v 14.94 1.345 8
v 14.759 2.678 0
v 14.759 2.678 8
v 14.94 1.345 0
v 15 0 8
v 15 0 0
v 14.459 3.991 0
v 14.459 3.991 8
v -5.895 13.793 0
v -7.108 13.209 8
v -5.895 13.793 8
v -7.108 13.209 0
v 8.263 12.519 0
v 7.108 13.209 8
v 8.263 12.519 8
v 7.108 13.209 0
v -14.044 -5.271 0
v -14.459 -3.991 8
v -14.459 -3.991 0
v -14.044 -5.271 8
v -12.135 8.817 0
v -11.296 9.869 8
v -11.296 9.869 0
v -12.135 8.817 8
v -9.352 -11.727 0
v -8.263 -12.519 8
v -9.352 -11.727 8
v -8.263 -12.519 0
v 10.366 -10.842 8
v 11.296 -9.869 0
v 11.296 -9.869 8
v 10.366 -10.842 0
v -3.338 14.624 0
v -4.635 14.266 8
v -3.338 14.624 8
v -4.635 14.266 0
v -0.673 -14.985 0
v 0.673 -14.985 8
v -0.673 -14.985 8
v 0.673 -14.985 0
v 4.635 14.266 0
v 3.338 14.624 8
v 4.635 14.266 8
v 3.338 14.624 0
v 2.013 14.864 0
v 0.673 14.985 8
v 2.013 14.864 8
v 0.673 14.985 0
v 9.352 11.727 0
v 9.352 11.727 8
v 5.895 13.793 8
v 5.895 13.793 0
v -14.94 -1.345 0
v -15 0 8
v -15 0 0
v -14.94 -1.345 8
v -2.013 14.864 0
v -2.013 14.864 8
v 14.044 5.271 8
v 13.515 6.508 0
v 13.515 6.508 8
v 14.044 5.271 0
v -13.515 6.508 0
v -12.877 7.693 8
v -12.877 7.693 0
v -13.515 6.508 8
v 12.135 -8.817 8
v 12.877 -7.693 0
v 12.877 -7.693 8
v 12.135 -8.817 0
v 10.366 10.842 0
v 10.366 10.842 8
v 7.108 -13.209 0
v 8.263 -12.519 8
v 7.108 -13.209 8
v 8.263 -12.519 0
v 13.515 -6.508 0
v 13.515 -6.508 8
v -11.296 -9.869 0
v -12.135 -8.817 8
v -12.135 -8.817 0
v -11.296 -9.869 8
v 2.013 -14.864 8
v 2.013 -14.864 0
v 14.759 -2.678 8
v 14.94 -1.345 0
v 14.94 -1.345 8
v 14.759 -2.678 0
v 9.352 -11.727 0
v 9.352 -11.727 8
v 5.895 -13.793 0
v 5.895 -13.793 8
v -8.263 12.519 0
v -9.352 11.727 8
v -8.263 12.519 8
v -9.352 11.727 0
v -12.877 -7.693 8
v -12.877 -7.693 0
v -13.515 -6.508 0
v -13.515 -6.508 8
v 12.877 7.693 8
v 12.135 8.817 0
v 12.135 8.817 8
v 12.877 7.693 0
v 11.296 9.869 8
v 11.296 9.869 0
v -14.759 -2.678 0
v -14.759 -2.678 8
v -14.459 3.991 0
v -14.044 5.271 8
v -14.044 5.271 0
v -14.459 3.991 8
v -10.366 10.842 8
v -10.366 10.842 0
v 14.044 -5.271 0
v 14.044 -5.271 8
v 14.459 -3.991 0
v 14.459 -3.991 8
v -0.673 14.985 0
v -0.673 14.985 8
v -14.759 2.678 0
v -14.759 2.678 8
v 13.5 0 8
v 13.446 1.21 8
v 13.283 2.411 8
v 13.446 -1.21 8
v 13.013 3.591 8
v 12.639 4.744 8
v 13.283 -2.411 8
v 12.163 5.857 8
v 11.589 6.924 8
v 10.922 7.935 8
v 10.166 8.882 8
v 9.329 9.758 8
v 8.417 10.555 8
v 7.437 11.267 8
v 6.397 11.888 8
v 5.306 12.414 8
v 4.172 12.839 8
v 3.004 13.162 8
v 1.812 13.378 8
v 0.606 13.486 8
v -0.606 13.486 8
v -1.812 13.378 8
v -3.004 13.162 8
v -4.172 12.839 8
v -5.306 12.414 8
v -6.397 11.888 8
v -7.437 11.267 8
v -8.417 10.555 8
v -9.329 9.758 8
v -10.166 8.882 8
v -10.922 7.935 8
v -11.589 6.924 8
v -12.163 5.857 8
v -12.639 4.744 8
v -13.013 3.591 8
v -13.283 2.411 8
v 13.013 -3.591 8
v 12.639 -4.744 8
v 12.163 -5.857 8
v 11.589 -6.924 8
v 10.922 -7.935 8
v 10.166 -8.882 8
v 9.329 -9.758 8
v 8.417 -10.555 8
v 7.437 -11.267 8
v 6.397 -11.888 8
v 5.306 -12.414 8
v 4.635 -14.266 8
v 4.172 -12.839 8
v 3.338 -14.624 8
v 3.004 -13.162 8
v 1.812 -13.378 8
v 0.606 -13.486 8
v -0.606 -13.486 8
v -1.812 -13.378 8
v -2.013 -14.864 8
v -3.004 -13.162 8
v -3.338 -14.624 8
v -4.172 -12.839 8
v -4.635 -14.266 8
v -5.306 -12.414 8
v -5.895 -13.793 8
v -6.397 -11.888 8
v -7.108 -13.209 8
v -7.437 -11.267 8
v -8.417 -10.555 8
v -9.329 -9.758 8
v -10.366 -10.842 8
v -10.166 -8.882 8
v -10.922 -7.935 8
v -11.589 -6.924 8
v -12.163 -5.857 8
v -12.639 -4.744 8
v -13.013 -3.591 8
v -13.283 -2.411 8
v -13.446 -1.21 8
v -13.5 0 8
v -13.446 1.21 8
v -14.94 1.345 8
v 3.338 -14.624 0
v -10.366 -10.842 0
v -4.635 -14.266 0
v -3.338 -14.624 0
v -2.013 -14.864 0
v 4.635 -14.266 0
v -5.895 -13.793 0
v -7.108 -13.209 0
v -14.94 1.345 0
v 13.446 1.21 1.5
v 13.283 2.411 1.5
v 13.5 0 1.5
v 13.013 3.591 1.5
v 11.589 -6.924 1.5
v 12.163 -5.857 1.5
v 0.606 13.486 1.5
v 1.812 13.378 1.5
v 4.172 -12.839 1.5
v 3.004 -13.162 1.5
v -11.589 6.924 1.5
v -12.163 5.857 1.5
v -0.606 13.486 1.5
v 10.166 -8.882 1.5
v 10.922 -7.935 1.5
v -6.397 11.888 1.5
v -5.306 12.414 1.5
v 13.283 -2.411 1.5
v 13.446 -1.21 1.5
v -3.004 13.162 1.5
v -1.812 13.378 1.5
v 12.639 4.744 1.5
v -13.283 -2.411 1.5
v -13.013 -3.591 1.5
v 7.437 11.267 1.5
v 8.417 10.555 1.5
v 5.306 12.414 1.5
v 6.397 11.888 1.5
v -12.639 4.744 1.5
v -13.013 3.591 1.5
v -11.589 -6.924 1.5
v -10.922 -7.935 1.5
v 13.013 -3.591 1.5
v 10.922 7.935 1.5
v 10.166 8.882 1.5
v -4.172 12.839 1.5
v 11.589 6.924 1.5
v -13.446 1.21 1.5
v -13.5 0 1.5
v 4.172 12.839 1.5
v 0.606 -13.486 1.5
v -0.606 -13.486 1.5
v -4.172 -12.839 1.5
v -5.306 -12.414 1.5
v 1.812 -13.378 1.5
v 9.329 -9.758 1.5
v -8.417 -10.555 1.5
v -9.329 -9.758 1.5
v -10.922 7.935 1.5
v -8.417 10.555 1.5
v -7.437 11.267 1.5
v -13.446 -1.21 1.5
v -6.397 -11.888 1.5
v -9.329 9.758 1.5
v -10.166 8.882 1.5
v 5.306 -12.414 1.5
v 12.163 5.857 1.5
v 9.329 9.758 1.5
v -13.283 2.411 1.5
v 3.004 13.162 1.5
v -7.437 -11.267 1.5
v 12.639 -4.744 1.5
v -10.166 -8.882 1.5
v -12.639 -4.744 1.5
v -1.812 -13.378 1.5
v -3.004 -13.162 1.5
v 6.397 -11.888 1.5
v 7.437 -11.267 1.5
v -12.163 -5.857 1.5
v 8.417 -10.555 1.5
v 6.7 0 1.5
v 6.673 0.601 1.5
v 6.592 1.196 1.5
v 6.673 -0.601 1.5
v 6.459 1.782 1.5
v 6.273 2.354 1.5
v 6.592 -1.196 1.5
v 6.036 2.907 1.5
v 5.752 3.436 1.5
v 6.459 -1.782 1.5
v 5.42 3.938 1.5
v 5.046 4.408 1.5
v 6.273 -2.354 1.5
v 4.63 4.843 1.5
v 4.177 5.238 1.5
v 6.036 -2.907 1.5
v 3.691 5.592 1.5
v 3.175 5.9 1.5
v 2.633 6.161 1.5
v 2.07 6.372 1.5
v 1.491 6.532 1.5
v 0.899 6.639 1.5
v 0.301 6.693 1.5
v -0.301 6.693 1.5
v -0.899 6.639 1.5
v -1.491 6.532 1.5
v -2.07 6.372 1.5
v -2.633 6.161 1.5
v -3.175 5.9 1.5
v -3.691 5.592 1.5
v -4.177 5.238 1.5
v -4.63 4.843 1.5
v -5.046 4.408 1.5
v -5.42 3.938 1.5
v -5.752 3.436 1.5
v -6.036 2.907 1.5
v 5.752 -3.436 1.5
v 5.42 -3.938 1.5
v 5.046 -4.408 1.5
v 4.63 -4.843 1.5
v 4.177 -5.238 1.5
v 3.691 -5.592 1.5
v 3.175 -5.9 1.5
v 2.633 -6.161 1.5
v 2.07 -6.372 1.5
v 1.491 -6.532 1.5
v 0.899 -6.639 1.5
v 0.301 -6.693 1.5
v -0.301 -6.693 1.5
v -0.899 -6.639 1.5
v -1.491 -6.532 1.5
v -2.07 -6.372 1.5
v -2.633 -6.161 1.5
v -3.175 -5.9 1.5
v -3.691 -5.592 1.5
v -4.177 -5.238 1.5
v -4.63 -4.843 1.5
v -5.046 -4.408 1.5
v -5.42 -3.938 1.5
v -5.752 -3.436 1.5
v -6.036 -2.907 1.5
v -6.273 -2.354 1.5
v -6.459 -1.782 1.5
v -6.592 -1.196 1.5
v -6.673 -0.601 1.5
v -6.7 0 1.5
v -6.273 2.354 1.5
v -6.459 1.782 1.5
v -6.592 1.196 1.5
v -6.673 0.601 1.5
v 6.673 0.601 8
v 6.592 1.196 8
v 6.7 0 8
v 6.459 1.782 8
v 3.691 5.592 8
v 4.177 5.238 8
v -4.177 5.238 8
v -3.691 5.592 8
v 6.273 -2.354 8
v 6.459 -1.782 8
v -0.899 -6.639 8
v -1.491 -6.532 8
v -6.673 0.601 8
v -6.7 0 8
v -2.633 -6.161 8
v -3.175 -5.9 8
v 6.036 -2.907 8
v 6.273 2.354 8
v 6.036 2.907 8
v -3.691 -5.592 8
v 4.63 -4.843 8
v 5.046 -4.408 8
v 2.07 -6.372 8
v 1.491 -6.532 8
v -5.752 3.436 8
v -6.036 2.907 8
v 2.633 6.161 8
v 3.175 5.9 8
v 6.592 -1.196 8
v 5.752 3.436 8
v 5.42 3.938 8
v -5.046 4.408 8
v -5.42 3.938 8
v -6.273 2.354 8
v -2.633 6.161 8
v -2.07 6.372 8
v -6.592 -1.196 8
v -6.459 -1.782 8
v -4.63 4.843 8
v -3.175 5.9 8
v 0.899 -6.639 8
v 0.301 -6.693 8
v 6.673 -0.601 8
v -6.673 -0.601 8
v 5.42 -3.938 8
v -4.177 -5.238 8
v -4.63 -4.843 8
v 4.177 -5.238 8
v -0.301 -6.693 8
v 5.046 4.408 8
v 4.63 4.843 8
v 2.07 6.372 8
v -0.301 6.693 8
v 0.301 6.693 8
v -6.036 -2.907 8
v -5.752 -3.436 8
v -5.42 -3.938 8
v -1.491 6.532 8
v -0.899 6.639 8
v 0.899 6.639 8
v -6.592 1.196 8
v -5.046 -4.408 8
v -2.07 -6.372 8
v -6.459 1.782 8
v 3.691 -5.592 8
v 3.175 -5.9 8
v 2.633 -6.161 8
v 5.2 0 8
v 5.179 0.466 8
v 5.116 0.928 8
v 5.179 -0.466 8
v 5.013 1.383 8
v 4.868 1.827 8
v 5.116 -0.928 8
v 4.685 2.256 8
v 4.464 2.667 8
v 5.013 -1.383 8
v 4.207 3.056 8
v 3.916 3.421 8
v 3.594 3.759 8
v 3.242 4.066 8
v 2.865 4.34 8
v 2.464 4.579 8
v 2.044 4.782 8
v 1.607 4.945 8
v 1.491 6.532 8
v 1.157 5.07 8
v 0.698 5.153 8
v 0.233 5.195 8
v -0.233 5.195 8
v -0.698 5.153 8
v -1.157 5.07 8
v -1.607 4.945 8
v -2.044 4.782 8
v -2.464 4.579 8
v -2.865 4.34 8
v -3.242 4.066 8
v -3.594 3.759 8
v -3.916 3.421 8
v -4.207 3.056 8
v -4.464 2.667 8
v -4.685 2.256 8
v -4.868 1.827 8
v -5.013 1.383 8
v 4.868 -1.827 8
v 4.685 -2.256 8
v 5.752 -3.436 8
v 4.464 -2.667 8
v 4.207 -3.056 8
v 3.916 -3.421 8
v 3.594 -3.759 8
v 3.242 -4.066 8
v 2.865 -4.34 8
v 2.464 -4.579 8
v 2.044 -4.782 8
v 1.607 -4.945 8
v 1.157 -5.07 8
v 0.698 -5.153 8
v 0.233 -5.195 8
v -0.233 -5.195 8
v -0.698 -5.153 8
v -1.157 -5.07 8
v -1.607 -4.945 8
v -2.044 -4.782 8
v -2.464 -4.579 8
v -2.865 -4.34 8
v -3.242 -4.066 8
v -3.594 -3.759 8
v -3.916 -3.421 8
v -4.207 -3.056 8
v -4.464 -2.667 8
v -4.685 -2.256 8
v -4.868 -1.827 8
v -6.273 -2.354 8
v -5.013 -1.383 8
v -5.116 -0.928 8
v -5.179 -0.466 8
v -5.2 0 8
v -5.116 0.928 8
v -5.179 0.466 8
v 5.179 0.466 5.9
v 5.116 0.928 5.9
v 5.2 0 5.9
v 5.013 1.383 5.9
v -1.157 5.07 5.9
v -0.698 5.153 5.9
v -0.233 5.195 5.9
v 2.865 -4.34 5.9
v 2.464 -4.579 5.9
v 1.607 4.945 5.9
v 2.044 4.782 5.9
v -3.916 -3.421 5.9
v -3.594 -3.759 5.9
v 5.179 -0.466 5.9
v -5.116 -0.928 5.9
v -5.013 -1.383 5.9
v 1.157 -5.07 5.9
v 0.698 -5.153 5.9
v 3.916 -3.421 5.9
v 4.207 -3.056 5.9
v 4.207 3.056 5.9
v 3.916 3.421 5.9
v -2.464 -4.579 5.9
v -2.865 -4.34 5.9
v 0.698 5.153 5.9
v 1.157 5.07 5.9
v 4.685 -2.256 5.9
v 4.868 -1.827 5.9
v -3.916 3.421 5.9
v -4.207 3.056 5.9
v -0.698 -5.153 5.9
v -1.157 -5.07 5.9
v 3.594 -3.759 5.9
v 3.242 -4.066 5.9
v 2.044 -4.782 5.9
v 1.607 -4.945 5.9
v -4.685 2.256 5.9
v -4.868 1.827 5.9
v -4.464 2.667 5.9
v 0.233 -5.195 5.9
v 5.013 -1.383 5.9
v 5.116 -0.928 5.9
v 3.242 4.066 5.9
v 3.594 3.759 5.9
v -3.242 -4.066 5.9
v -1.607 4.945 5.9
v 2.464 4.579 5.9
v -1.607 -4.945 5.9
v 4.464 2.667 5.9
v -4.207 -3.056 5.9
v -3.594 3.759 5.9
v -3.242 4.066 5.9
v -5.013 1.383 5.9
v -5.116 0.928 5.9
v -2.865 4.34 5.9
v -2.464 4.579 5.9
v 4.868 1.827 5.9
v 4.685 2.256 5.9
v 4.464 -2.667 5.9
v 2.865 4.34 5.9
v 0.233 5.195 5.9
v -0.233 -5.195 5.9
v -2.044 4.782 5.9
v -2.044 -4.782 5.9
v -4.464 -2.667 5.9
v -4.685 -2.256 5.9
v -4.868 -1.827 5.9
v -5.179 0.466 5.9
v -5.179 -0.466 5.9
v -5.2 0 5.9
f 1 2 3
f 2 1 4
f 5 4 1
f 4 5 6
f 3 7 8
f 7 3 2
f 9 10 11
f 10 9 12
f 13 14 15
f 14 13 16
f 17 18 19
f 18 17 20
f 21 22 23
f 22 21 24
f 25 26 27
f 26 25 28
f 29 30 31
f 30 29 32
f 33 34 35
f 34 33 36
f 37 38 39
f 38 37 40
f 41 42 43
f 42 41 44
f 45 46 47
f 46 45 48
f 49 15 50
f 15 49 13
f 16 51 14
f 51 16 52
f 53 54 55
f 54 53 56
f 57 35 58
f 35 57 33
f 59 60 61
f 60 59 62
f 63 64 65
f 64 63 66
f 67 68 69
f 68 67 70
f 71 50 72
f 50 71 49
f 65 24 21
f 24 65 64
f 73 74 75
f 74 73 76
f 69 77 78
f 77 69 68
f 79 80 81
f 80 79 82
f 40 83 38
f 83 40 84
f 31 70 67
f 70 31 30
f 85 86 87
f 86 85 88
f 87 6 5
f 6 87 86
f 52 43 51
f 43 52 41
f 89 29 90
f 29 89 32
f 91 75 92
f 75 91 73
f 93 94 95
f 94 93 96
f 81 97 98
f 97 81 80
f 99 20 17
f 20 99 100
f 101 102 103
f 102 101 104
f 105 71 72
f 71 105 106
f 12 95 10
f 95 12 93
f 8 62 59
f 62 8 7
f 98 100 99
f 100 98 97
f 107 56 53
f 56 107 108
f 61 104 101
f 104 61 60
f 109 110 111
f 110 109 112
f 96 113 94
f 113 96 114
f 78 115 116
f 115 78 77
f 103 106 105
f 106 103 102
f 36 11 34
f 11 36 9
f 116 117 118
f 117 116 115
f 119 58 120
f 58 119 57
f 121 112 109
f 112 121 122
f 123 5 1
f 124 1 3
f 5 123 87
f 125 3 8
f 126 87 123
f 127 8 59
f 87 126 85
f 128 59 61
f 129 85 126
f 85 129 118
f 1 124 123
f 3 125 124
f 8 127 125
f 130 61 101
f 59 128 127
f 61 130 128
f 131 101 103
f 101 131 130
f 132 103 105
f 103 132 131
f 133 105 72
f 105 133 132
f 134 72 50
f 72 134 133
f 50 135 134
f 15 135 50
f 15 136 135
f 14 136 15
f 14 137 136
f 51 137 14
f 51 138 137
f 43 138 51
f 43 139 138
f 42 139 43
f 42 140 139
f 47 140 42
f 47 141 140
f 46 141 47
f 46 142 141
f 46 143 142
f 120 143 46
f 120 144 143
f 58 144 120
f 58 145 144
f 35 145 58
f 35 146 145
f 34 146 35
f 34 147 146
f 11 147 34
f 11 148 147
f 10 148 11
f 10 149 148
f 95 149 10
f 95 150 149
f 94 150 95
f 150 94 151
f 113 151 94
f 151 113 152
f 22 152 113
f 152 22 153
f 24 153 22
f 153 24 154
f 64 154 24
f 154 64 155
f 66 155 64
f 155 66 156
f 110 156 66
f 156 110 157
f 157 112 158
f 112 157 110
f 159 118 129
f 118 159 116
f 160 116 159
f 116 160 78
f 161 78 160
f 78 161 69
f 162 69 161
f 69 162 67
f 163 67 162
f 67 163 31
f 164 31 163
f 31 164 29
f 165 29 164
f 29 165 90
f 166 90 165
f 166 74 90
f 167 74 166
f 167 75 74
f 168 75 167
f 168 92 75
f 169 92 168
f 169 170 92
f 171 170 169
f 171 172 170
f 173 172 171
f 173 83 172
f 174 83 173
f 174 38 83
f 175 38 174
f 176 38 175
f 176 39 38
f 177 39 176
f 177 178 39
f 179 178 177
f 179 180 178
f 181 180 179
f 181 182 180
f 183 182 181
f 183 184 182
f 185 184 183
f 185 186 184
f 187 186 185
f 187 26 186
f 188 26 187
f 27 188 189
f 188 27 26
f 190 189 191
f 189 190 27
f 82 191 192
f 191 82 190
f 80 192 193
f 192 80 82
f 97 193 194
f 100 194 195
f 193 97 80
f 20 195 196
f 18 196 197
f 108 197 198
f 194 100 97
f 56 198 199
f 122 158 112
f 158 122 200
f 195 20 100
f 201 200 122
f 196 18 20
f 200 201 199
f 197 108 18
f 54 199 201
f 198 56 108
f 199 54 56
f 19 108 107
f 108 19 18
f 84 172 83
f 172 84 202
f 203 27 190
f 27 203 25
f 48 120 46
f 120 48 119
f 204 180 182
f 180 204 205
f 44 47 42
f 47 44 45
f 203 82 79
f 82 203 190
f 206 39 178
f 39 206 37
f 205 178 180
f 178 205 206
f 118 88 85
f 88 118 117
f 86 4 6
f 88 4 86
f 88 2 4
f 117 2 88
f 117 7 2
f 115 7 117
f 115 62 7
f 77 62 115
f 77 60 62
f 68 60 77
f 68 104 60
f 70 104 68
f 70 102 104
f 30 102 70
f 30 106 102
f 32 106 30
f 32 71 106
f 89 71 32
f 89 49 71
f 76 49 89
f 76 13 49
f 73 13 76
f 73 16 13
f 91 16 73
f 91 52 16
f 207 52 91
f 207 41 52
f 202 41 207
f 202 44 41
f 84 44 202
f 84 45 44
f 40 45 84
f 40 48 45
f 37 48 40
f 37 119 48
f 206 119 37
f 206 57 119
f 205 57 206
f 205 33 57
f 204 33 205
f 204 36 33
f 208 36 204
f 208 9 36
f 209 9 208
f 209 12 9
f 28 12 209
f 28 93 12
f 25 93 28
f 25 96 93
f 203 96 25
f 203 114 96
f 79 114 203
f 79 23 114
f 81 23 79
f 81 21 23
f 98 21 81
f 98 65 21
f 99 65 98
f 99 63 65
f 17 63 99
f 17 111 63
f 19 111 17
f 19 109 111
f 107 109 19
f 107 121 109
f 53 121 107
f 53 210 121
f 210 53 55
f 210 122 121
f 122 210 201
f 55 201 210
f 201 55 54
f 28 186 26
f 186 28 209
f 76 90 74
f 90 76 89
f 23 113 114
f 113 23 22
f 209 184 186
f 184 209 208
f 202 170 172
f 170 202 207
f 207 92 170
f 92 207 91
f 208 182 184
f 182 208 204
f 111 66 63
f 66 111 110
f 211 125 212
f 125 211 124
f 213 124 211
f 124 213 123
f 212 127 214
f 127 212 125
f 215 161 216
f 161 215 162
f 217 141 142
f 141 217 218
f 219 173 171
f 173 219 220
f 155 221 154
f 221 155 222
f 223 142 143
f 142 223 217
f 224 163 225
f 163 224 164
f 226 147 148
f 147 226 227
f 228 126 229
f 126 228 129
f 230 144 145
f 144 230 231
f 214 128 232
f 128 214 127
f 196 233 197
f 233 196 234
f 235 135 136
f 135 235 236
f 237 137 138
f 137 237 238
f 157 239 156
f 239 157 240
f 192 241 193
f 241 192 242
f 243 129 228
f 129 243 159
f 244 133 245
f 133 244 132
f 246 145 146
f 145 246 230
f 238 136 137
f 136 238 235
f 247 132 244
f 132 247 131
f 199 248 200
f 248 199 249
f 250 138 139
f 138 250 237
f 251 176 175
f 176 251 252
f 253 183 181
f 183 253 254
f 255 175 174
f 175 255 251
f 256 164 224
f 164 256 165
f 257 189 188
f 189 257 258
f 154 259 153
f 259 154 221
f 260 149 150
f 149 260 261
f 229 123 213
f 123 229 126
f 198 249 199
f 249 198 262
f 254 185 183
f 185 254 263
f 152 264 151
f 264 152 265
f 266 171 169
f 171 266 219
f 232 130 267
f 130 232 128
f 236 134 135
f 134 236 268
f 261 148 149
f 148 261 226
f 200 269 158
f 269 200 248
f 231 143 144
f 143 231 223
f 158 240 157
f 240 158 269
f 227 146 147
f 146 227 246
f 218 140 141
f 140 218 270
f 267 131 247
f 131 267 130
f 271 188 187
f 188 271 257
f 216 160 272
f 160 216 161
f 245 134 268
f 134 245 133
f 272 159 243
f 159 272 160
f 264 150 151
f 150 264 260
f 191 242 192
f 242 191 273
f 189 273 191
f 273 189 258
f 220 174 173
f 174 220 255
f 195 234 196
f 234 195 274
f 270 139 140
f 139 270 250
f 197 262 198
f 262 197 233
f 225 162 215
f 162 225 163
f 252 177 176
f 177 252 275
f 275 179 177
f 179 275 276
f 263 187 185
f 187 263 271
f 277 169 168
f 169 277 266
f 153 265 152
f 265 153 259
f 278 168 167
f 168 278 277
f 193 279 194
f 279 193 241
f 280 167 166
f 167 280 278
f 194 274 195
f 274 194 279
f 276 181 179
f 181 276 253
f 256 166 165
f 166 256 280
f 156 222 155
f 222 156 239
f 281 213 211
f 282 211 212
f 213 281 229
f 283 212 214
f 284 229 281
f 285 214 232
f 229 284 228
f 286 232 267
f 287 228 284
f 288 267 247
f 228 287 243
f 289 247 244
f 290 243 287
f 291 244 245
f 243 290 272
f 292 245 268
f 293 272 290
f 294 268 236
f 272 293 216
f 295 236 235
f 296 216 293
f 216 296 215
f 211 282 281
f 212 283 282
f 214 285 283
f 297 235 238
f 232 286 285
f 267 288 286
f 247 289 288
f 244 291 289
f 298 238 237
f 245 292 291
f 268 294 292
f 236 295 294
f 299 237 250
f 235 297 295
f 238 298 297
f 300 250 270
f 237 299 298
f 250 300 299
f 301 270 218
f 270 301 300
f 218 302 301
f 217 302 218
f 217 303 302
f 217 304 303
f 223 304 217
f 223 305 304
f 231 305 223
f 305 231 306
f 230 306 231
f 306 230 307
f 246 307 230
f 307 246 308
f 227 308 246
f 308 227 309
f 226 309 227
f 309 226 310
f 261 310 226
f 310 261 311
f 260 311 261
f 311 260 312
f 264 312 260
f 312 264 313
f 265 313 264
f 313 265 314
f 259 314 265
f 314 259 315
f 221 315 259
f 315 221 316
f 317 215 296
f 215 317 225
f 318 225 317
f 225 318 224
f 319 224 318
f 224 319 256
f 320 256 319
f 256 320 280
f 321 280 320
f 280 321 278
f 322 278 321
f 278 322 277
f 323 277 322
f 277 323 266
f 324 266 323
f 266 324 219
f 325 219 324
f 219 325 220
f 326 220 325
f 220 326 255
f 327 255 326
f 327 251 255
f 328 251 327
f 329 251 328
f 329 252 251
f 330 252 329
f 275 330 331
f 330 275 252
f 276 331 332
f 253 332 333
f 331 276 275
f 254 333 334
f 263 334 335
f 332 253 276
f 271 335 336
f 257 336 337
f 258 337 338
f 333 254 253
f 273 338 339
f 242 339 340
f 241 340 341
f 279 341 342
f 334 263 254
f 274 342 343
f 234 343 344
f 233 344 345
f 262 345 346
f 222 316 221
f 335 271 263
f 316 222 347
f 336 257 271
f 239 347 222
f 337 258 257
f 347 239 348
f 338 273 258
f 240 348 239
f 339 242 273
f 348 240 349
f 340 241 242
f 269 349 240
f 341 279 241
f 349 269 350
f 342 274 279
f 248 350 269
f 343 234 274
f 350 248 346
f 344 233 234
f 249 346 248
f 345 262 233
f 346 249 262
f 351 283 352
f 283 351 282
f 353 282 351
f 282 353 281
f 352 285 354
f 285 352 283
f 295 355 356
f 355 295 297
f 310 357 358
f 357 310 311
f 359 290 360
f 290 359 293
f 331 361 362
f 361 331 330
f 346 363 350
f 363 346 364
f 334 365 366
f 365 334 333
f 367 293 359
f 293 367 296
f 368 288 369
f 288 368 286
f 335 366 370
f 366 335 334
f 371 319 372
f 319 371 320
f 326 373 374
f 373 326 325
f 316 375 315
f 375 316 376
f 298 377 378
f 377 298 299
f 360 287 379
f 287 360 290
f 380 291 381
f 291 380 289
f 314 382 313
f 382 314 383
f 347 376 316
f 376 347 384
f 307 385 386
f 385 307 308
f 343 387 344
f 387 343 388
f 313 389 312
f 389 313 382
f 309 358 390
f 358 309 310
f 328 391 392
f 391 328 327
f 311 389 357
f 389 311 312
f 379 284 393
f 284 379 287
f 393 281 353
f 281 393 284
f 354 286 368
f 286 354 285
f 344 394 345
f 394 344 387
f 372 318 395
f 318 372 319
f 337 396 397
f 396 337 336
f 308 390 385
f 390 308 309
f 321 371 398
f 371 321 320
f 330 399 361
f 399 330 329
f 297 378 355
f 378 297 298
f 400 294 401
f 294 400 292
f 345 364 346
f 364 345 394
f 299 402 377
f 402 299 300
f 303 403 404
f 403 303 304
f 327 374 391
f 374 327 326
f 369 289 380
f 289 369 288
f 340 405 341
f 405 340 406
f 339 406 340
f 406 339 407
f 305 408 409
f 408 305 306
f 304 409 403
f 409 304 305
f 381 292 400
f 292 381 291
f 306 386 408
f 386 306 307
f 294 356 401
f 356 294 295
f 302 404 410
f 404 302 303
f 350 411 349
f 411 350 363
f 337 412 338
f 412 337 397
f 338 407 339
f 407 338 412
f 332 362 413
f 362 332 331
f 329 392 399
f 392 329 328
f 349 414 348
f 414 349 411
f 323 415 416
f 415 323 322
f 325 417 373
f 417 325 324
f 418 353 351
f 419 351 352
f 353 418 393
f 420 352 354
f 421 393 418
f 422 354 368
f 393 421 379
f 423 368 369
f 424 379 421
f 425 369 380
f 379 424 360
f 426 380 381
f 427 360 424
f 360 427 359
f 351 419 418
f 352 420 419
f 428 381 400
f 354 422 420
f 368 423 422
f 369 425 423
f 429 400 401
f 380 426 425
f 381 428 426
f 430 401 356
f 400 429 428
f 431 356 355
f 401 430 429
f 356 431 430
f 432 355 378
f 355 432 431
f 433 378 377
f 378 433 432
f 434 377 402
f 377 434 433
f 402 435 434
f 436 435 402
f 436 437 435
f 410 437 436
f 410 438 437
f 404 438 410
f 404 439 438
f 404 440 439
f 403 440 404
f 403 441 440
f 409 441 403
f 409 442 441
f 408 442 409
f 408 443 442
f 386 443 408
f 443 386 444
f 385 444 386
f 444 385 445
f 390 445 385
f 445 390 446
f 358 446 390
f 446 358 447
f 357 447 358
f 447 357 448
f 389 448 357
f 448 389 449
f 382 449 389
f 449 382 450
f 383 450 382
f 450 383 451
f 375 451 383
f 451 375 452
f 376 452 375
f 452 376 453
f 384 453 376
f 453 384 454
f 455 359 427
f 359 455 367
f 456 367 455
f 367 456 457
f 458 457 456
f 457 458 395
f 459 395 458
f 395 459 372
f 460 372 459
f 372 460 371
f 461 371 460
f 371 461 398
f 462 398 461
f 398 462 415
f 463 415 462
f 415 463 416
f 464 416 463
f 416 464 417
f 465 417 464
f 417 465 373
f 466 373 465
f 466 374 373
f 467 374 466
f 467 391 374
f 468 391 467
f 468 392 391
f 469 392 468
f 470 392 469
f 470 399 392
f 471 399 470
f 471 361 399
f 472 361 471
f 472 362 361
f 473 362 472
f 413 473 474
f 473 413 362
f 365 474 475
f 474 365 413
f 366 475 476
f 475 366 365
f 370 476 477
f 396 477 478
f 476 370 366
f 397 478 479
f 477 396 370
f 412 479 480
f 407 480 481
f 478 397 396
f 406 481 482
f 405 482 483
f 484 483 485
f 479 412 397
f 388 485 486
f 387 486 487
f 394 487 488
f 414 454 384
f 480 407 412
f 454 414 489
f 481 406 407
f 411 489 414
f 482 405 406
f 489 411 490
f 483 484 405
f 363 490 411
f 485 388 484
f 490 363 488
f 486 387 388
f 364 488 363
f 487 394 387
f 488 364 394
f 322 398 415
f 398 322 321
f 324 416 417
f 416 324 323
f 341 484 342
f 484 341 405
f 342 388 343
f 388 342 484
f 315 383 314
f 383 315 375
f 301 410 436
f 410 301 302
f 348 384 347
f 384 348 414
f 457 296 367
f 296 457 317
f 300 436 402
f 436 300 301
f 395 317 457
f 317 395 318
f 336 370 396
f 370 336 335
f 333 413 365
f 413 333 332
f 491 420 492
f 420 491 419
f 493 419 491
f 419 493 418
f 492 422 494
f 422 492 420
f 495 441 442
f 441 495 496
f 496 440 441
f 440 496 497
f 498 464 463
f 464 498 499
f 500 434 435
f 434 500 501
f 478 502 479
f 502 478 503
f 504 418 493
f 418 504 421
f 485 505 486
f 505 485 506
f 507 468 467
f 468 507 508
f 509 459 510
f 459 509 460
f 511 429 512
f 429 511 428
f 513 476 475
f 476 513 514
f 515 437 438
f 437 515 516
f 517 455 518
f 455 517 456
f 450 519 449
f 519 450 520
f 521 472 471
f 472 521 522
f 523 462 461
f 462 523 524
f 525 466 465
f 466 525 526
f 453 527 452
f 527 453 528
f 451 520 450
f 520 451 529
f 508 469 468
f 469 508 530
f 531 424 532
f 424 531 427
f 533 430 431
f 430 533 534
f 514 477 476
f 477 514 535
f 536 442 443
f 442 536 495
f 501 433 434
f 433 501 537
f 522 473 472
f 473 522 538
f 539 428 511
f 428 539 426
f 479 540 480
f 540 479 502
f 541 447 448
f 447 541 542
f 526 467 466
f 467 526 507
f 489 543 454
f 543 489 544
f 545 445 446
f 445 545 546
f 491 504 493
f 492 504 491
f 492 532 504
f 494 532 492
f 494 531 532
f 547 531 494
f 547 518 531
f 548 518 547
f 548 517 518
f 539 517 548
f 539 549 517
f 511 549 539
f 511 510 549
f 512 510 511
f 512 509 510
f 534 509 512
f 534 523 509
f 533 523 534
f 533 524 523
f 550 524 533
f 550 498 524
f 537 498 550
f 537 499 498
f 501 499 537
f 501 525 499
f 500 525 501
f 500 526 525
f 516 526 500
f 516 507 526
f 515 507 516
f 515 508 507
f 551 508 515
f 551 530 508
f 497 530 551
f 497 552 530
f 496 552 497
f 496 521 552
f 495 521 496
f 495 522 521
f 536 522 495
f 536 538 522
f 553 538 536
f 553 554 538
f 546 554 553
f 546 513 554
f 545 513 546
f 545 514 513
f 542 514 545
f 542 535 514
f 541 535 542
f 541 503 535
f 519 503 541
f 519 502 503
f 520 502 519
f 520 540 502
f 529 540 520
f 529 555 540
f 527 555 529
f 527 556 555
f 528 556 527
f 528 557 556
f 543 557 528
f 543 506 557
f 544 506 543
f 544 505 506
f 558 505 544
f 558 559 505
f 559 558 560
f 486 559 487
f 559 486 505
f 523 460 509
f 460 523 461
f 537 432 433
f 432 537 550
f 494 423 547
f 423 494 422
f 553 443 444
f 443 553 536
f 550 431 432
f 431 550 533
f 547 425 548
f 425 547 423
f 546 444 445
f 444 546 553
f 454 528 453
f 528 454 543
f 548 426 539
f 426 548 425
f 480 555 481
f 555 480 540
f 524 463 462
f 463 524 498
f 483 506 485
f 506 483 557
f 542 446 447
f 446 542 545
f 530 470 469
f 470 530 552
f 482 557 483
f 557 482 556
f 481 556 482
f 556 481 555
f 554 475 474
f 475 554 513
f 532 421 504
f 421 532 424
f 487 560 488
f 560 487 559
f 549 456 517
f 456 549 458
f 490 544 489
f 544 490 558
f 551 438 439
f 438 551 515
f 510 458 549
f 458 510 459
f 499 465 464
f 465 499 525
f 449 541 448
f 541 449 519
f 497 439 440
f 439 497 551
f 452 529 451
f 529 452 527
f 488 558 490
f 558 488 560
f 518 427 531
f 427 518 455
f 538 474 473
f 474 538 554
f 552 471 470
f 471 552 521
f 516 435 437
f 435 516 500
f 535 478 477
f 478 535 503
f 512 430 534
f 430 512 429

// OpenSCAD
//Body height in mm.
Body_height = 8;
//Body diameter in mm.
Body_diameter = 30;
//Thickness of the magnet in mm.
Magnet_thickness = 2;
//Diamter of the magnet in mm.
Magnet_diameter = 10;
//Magnet height
Height_tolerance = 0.1;
//Magnet diameter
Diameter_tolerance = 0.2;
//Model resolution
Resolution = 70;

difference(){
    //Main body
    cylinder(h=Body_height, d=Body_diameter, $fn = Resolution);
        //Up 1,5 mm
        translate([0,0,1.5])
            //Hollow out
            cylinder(h=Body_height, d=Body_diameter-3, $fn = Resolution);    
    
}
difference(){
    //Inner cylinder
    cylinder(h=Body_height, d=Magnet_diameter+3+(Diameter_tolerance*2), $fn = Resolution);
        //Position    
        translate([0,0,Body_height-(Magnet_thickness+Height_tolerance)])        //Hollow out
            cylinder(h=Magnet_thickness+1,d=Magnet_diameter+(Diameter_tolerance*2), $fn = Resolution);
}
